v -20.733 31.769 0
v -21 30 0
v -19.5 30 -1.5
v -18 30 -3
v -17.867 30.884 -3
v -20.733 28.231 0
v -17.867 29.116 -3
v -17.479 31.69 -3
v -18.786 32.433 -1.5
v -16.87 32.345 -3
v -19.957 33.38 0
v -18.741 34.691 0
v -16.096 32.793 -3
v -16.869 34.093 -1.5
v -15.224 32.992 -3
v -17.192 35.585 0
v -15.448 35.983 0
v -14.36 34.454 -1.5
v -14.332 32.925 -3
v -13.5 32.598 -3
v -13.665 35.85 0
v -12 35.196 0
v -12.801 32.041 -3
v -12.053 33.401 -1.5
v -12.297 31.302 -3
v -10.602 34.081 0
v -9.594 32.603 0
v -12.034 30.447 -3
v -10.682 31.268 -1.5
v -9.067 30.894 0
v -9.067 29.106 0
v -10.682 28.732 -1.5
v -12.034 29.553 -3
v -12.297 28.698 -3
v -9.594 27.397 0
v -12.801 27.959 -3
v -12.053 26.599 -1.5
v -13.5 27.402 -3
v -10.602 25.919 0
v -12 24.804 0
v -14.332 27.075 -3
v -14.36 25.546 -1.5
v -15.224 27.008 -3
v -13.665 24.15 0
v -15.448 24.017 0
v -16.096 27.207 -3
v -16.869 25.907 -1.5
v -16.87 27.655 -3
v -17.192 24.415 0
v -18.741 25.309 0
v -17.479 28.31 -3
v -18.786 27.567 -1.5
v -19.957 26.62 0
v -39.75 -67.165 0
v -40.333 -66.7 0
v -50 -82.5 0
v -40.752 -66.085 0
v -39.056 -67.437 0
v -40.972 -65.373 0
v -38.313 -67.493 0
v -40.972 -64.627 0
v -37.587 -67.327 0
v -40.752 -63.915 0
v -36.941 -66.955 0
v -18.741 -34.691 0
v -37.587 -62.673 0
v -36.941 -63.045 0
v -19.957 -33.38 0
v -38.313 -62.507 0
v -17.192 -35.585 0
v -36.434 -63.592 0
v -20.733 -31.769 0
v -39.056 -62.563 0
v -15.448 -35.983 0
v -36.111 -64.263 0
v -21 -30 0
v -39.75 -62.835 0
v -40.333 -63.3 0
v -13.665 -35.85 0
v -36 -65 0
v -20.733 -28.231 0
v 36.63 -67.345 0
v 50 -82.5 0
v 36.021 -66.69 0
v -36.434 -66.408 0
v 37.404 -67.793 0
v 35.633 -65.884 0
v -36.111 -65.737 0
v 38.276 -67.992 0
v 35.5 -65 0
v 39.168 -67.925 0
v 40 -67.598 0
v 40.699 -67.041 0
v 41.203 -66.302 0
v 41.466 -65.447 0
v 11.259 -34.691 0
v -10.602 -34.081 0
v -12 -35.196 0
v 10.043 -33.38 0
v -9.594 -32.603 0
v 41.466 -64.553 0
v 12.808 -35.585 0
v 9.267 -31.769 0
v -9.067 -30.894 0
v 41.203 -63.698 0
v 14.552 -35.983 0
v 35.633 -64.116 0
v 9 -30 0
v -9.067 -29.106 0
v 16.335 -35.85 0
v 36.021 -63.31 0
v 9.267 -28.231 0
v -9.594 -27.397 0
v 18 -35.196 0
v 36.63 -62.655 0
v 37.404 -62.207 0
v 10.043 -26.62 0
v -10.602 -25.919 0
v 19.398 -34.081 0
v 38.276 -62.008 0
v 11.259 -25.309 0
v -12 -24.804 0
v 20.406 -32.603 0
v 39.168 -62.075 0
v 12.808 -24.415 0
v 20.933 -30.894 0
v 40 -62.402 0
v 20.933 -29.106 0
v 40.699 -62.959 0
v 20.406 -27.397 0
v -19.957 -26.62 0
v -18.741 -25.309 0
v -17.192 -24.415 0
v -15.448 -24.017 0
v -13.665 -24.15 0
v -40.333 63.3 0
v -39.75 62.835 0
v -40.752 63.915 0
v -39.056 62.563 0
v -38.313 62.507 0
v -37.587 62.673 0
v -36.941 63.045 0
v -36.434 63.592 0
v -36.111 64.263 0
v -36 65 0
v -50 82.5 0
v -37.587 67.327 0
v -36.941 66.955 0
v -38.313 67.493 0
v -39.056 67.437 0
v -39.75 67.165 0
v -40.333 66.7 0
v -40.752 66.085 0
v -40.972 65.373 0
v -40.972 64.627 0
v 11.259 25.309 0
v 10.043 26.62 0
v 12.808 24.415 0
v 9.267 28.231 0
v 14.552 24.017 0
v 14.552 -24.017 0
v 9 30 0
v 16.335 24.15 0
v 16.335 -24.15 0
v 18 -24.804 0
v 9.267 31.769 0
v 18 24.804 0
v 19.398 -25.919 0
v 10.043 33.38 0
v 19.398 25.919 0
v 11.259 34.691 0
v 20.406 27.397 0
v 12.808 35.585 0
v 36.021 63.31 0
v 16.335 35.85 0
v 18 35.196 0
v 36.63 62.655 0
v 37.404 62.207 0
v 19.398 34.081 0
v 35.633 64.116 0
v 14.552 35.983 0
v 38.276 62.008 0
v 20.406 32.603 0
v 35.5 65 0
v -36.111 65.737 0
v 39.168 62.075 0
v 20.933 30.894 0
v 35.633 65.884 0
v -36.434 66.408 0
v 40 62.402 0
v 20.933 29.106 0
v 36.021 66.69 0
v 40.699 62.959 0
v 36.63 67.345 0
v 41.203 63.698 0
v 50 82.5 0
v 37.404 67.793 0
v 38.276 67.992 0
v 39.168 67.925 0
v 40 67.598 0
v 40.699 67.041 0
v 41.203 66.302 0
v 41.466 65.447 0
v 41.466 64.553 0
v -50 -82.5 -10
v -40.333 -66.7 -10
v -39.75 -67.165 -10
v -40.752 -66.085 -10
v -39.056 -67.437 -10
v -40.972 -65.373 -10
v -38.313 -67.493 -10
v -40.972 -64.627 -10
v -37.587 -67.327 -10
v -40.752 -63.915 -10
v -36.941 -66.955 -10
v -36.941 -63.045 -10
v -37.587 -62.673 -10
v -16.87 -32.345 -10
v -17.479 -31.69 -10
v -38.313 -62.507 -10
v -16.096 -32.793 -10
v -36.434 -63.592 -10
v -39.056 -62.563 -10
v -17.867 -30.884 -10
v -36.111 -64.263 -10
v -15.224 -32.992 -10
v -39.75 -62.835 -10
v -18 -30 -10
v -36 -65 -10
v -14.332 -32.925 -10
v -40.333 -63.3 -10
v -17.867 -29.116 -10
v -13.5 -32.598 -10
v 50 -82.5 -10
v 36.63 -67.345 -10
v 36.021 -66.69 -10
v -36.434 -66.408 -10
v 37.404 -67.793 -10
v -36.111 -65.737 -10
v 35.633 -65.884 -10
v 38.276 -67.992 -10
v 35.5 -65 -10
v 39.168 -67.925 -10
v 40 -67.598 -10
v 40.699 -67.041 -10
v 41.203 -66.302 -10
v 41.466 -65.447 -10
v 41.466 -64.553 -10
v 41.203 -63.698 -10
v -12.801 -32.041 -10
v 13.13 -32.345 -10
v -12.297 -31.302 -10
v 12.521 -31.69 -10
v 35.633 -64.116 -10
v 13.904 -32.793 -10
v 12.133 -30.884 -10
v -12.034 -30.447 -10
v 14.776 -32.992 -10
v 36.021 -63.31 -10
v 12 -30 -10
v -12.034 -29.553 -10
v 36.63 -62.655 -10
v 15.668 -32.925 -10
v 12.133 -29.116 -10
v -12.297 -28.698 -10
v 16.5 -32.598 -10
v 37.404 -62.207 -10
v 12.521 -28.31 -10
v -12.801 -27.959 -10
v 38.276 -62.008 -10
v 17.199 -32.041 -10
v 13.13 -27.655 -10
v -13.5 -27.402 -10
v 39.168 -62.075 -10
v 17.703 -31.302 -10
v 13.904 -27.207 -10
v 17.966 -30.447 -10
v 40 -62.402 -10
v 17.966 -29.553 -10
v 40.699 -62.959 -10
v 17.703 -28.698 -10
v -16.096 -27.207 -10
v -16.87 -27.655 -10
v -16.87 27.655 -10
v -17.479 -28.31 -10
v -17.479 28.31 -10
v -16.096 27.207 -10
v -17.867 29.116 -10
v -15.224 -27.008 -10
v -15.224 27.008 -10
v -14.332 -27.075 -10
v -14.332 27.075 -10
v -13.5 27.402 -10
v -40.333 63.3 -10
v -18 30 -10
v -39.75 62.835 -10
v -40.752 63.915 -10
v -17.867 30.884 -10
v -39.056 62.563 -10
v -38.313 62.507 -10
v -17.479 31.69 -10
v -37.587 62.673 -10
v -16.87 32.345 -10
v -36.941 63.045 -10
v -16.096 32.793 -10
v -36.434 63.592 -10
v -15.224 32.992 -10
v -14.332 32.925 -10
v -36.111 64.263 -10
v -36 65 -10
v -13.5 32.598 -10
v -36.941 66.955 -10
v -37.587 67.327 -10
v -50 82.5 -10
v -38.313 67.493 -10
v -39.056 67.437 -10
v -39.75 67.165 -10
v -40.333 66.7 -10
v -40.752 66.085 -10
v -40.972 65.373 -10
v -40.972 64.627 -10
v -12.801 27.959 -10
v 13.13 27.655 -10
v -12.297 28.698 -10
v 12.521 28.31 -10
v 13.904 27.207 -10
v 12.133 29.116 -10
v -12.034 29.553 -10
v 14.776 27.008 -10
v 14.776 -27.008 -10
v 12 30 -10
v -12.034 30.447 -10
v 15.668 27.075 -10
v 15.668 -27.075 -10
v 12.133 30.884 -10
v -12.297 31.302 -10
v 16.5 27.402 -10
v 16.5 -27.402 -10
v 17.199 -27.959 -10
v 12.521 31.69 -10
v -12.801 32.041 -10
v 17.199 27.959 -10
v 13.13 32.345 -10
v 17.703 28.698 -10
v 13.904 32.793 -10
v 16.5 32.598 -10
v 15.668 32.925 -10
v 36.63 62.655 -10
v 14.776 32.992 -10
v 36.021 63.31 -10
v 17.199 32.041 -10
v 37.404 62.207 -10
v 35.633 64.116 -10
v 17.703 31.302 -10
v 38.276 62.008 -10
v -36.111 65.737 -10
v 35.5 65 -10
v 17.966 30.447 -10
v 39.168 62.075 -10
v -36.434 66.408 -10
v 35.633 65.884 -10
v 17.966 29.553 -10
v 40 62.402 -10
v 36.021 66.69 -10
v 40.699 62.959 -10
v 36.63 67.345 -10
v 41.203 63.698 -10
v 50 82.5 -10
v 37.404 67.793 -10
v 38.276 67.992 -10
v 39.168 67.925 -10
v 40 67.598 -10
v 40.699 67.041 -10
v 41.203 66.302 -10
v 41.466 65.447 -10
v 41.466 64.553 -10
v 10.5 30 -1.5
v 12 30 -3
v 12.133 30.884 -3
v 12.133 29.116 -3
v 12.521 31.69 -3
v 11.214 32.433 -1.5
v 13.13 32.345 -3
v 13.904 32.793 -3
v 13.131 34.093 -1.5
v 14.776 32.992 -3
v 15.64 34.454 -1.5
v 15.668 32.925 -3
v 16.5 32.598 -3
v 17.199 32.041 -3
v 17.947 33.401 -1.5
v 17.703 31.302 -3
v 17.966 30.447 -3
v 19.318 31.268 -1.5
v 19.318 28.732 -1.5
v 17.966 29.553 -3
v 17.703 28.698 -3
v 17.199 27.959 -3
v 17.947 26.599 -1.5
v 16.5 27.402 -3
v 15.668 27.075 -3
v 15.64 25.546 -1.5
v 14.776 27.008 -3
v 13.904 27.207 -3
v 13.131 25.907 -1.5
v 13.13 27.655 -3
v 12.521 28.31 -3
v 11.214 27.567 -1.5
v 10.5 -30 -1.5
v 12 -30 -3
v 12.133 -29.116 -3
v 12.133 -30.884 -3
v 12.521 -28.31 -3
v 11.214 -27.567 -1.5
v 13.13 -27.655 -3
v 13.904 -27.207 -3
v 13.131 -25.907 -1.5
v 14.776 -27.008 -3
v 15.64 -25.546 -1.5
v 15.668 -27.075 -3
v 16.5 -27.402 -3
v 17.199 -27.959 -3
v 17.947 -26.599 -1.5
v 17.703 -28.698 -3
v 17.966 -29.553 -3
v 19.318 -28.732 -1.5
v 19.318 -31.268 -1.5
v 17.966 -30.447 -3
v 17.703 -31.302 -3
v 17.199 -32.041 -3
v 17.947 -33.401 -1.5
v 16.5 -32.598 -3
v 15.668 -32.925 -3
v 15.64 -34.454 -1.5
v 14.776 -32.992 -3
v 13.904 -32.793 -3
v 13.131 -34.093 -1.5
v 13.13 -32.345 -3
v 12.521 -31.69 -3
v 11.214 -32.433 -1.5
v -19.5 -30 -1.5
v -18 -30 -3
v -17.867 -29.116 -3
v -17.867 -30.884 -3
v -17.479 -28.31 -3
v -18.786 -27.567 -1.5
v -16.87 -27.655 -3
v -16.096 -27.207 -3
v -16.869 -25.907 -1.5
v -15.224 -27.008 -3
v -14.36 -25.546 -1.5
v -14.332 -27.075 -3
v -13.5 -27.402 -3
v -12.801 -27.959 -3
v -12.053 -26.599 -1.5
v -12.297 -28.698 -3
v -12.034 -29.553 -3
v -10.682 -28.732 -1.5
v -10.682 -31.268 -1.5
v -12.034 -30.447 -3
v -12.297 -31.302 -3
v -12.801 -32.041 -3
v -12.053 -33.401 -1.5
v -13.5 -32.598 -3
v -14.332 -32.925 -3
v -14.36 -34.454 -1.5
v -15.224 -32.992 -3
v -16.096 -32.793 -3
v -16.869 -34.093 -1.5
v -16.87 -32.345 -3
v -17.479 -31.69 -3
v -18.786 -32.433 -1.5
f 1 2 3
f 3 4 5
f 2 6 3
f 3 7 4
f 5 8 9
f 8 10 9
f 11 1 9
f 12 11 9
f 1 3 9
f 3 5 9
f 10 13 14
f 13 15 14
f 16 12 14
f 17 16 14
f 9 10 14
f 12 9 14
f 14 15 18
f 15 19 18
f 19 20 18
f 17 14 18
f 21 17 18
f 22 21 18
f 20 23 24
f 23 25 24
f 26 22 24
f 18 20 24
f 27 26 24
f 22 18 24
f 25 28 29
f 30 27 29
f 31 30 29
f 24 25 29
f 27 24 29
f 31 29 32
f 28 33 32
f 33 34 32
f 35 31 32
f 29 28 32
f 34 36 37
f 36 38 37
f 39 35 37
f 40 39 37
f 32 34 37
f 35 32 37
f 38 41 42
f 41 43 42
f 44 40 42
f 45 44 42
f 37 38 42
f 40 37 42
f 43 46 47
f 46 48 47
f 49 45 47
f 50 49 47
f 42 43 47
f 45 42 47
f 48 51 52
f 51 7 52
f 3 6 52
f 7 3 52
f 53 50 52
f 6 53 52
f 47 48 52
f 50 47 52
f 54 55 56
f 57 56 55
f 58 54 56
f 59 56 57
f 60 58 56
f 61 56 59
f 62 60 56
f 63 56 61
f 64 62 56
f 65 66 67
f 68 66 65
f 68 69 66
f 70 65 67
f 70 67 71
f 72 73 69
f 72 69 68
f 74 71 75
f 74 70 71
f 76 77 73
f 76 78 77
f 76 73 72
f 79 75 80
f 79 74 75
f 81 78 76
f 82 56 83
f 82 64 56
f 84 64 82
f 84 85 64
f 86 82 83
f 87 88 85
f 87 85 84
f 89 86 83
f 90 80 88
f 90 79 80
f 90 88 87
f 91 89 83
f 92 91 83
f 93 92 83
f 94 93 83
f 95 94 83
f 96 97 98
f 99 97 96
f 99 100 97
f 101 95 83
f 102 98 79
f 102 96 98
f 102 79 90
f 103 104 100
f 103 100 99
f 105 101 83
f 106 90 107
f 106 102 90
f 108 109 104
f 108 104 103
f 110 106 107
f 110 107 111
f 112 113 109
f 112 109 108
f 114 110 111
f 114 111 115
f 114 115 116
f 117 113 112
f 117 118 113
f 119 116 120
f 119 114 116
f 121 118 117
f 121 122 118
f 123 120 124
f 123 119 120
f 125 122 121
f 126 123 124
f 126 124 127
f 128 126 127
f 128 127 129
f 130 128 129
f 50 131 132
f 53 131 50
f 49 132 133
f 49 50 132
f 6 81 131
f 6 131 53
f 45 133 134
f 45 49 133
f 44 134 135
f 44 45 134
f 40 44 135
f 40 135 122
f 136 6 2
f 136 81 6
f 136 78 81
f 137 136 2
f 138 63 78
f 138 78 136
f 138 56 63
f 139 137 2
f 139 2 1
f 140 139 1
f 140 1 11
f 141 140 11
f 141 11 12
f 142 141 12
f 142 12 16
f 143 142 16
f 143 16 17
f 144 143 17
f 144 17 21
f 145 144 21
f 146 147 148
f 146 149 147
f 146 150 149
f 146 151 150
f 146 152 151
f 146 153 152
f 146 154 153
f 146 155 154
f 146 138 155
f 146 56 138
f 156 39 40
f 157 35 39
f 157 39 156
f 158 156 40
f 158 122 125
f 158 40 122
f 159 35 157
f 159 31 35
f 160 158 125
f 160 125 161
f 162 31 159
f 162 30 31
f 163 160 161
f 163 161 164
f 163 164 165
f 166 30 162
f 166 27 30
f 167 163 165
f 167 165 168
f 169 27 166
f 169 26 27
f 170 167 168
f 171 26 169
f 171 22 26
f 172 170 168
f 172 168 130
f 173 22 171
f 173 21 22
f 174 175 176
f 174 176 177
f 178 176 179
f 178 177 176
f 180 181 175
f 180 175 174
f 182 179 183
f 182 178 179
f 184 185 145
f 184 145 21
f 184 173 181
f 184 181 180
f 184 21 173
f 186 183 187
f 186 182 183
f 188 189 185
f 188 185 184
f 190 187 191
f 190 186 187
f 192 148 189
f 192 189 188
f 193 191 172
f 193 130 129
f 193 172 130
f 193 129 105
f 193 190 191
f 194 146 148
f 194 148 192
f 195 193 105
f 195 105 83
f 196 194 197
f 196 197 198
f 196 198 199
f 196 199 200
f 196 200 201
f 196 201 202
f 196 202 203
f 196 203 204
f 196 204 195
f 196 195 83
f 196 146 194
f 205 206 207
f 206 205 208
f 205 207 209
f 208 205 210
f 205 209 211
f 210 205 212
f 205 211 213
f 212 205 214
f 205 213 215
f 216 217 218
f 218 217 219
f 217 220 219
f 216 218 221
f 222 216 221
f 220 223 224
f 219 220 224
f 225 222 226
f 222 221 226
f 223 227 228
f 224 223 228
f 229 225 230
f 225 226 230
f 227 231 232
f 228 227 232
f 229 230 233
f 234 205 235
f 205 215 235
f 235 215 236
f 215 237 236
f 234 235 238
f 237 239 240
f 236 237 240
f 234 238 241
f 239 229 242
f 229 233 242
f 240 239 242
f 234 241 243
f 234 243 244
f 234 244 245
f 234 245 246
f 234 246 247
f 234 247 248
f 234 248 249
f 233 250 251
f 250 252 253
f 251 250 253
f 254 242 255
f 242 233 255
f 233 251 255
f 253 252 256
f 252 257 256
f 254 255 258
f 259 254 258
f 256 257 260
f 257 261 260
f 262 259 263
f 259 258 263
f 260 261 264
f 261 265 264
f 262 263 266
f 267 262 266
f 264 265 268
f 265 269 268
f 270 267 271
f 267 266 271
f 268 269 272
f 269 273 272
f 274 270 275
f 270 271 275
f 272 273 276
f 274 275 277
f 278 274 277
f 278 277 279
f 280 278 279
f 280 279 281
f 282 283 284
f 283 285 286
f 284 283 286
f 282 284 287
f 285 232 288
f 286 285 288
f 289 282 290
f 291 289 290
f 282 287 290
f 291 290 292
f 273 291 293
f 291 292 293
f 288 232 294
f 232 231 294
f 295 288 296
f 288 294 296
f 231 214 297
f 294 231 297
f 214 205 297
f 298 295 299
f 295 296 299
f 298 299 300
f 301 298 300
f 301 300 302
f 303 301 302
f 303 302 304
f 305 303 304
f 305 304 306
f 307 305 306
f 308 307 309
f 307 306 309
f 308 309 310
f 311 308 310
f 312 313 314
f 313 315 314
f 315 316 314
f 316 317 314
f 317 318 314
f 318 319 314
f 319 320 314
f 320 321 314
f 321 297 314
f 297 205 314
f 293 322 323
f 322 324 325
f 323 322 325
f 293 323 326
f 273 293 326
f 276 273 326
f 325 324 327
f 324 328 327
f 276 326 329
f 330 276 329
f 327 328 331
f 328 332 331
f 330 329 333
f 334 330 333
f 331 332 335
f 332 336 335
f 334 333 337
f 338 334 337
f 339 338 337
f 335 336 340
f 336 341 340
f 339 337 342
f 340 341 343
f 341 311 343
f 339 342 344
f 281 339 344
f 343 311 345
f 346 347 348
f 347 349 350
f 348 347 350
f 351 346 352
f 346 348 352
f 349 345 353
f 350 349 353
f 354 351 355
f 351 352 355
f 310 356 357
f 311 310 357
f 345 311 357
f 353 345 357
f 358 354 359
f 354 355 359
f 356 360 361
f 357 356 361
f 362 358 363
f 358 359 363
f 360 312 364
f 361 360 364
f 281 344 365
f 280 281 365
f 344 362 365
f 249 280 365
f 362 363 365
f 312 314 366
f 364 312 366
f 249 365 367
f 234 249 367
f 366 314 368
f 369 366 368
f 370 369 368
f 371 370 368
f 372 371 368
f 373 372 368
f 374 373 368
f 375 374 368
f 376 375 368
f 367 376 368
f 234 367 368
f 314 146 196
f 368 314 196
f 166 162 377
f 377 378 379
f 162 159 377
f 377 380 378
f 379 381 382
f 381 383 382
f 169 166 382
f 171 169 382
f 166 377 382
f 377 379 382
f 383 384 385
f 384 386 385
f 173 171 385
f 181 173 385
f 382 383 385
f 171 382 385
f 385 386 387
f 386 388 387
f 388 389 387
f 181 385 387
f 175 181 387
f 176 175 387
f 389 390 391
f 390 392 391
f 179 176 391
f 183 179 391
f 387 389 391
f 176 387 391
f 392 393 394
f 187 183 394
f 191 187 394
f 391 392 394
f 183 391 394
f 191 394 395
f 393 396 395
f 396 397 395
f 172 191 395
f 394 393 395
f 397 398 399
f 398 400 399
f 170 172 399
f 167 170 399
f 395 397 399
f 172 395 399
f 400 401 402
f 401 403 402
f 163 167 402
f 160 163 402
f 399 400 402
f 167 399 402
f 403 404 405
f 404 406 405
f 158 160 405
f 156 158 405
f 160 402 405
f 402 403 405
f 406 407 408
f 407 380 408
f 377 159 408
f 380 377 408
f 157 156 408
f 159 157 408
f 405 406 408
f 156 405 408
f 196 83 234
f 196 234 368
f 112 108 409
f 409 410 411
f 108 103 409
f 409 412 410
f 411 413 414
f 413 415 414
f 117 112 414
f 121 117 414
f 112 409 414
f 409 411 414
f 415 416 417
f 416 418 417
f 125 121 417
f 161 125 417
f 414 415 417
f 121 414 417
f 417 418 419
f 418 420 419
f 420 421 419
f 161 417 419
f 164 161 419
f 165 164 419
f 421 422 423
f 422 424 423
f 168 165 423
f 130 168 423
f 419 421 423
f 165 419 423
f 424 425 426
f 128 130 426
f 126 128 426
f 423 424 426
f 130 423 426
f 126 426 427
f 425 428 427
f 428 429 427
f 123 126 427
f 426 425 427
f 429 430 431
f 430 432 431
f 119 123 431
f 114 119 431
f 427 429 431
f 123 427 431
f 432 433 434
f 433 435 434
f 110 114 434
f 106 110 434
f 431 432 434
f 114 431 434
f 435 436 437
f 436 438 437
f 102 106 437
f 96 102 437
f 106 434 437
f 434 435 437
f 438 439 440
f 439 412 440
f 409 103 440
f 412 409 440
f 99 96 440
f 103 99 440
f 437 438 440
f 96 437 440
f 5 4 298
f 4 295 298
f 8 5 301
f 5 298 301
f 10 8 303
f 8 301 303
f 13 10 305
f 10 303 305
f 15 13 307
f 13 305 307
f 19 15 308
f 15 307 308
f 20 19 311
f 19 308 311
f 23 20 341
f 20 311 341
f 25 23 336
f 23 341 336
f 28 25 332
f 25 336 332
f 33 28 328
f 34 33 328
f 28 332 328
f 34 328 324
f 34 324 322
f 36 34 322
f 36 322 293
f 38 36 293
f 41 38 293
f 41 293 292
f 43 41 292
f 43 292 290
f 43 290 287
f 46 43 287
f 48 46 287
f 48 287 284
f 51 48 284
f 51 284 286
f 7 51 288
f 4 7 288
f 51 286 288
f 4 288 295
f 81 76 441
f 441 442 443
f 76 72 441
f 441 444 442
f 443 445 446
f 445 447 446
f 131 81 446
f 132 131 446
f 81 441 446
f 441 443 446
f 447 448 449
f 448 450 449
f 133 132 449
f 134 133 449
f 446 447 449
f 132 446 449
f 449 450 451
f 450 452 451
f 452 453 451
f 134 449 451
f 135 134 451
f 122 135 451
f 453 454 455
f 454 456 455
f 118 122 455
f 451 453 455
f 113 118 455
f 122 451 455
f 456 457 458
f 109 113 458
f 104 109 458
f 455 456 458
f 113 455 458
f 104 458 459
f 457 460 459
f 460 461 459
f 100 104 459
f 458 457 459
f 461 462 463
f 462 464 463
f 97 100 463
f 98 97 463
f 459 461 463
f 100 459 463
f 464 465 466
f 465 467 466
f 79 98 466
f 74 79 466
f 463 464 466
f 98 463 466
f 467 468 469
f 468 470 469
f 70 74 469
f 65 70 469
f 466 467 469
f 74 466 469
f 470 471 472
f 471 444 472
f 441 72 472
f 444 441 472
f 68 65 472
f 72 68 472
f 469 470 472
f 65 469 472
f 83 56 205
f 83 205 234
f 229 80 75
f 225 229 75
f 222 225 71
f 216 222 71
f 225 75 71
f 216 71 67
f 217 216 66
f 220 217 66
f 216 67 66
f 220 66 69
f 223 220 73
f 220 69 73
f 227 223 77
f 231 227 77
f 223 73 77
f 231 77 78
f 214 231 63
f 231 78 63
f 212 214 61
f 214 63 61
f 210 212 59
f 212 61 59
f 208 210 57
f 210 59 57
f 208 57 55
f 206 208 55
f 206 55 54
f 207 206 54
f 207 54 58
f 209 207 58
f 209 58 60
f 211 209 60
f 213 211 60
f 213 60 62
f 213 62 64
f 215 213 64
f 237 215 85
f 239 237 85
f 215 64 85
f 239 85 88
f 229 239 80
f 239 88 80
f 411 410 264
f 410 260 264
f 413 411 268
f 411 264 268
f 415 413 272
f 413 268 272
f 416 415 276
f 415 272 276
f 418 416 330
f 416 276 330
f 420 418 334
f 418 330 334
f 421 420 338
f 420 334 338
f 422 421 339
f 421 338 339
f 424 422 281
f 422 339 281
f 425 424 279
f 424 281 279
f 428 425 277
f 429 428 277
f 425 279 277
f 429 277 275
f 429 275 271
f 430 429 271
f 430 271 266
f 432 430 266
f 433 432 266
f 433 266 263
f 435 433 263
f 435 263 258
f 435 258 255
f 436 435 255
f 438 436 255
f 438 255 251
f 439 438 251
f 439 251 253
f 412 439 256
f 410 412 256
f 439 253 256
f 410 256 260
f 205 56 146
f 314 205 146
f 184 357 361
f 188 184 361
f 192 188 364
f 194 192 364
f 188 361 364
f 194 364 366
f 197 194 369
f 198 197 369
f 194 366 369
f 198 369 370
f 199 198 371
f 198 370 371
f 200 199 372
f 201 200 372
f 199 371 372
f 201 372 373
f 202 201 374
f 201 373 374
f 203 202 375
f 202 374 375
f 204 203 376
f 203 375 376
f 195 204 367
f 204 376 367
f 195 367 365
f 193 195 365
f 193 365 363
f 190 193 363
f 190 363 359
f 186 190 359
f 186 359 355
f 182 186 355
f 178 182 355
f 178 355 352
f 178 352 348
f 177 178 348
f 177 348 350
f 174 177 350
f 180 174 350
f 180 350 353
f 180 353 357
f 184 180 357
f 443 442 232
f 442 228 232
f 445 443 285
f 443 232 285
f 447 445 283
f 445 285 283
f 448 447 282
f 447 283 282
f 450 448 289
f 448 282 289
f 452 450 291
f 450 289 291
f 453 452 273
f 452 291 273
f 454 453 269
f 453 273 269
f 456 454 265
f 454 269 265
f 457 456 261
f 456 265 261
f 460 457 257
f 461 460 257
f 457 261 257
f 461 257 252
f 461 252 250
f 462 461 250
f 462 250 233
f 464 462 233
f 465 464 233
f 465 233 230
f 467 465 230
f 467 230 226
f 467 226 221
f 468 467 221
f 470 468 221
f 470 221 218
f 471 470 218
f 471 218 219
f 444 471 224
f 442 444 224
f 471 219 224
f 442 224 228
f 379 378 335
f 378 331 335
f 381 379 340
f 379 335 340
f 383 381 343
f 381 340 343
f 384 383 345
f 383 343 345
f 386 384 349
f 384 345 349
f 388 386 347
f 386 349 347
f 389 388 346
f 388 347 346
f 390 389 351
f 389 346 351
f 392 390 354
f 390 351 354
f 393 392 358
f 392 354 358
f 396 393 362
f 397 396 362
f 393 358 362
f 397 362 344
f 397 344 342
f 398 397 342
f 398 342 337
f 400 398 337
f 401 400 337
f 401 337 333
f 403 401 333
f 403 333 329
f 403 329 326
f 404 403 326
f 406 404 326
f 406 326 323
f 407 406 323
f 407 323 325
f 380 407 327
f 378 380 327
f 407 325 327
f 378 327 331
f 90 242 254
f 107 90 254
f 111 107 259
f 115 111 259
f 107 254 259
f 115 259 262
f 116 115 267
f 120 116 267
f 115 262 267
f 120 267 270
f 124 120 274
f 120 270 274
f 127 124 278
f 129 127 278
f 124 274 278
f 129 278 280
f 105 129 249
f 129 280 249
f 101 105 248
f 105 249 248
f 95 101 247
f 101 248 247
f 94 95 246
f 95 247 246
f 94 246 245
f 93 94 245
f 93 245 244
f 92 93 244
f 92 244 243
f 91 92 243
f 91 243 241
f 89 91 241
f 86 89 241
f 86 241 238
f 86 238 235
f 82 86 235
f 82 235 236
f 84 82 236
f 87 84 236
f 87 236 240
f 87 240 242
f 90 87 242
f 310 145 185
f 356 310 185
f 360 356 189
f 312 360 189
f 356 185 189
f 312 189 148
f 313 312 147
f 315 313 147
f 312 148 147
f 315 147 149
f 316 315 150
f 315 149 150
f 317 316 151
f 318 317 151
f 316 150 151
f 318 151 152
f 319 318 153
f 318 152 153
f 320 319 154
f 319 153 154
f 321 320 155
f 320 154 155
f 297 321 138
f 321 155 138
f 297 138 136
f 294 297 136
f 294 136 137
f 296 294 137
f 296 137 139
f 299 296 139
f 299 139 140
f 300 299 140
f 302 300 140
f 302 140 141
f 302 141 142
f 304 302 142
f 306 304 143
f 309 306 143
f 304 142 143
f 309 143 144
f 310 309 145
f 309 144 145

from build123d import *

# Parameters (mm, degrees)
F0_W           = 100
F0_H           = 165
F0_R           = 2.5
F0_R_2         = 3
F1_DEPTH       = 10
F2_D           = 6
F2_CSINK_D     = 12
F2_CSINK_ANGLE = 90
F3_D           = 6


with BuildPart() as f1:
    # F0 (on Top) → F1 (new body)
    with BuildSketch(Plane.XY):
        Rectangle(F0_W, F0_H)
        with Locations((-38.5, -65)):
            Circle(F0_R, mode=Mode.SUBTRACT)
        with Locations((-15, -30)):
            Circle(F0_R_2, mode=Mode.SUBTRACT)
        with Locations((38.5, -65)):
            Circle(F0_R, mode=Mode.SUBTRACT)
        with Locations((15, -30)):
            Circle(F0_R_2, mode=Mode.SUBTRACT)
        with Locations((-15, 30)):
            Circle(F0_R_2, mode=Mode.SUBTRACT)
        with Locations((-38.5, 65)):
            Circle(F0_R, mode=Mode.SUBTRACT)
        with Locations((15, 30)):
            Circle(F0_R_2, mode=Mode.SUBTRACT)
        with Locations((38.5, 65)):
            Circle(F0_R, mode=Mode.SUBTRACT)
        with Locations((-15, 30)):
            Circle(F0_R_2)
        with Locations((-15, -30)):
            Circle(F0_R_2)
        with Locations((15, -30)):
            Circle(F0_R_2)
        with Locations((38.5, -65)):
            Circle(F0_R)
        with Locations((15, 30)):
            Circle(F0_R_2)
        with Locations((38.5, 65)):
            Circle(F0_R)
    extrude(amount=-F1_DEPTH)

    # F2 (through all)
    with Locations(Plane.XY):
        with Locations((-15, 30), (15, 30), (-15, -30), (15, -30)):
            CounterSinkHole(F2_D / 2, F2_CSINK_D / 2, counter_sink_angle=F2_CSINK_ANGLE)

    # F3 (through all)
    with Locations(Plane.XY):
        with Locations((38.5, 65), (38.5, -65)):
            Hole(F3_D / 2)


solid = f1.part
